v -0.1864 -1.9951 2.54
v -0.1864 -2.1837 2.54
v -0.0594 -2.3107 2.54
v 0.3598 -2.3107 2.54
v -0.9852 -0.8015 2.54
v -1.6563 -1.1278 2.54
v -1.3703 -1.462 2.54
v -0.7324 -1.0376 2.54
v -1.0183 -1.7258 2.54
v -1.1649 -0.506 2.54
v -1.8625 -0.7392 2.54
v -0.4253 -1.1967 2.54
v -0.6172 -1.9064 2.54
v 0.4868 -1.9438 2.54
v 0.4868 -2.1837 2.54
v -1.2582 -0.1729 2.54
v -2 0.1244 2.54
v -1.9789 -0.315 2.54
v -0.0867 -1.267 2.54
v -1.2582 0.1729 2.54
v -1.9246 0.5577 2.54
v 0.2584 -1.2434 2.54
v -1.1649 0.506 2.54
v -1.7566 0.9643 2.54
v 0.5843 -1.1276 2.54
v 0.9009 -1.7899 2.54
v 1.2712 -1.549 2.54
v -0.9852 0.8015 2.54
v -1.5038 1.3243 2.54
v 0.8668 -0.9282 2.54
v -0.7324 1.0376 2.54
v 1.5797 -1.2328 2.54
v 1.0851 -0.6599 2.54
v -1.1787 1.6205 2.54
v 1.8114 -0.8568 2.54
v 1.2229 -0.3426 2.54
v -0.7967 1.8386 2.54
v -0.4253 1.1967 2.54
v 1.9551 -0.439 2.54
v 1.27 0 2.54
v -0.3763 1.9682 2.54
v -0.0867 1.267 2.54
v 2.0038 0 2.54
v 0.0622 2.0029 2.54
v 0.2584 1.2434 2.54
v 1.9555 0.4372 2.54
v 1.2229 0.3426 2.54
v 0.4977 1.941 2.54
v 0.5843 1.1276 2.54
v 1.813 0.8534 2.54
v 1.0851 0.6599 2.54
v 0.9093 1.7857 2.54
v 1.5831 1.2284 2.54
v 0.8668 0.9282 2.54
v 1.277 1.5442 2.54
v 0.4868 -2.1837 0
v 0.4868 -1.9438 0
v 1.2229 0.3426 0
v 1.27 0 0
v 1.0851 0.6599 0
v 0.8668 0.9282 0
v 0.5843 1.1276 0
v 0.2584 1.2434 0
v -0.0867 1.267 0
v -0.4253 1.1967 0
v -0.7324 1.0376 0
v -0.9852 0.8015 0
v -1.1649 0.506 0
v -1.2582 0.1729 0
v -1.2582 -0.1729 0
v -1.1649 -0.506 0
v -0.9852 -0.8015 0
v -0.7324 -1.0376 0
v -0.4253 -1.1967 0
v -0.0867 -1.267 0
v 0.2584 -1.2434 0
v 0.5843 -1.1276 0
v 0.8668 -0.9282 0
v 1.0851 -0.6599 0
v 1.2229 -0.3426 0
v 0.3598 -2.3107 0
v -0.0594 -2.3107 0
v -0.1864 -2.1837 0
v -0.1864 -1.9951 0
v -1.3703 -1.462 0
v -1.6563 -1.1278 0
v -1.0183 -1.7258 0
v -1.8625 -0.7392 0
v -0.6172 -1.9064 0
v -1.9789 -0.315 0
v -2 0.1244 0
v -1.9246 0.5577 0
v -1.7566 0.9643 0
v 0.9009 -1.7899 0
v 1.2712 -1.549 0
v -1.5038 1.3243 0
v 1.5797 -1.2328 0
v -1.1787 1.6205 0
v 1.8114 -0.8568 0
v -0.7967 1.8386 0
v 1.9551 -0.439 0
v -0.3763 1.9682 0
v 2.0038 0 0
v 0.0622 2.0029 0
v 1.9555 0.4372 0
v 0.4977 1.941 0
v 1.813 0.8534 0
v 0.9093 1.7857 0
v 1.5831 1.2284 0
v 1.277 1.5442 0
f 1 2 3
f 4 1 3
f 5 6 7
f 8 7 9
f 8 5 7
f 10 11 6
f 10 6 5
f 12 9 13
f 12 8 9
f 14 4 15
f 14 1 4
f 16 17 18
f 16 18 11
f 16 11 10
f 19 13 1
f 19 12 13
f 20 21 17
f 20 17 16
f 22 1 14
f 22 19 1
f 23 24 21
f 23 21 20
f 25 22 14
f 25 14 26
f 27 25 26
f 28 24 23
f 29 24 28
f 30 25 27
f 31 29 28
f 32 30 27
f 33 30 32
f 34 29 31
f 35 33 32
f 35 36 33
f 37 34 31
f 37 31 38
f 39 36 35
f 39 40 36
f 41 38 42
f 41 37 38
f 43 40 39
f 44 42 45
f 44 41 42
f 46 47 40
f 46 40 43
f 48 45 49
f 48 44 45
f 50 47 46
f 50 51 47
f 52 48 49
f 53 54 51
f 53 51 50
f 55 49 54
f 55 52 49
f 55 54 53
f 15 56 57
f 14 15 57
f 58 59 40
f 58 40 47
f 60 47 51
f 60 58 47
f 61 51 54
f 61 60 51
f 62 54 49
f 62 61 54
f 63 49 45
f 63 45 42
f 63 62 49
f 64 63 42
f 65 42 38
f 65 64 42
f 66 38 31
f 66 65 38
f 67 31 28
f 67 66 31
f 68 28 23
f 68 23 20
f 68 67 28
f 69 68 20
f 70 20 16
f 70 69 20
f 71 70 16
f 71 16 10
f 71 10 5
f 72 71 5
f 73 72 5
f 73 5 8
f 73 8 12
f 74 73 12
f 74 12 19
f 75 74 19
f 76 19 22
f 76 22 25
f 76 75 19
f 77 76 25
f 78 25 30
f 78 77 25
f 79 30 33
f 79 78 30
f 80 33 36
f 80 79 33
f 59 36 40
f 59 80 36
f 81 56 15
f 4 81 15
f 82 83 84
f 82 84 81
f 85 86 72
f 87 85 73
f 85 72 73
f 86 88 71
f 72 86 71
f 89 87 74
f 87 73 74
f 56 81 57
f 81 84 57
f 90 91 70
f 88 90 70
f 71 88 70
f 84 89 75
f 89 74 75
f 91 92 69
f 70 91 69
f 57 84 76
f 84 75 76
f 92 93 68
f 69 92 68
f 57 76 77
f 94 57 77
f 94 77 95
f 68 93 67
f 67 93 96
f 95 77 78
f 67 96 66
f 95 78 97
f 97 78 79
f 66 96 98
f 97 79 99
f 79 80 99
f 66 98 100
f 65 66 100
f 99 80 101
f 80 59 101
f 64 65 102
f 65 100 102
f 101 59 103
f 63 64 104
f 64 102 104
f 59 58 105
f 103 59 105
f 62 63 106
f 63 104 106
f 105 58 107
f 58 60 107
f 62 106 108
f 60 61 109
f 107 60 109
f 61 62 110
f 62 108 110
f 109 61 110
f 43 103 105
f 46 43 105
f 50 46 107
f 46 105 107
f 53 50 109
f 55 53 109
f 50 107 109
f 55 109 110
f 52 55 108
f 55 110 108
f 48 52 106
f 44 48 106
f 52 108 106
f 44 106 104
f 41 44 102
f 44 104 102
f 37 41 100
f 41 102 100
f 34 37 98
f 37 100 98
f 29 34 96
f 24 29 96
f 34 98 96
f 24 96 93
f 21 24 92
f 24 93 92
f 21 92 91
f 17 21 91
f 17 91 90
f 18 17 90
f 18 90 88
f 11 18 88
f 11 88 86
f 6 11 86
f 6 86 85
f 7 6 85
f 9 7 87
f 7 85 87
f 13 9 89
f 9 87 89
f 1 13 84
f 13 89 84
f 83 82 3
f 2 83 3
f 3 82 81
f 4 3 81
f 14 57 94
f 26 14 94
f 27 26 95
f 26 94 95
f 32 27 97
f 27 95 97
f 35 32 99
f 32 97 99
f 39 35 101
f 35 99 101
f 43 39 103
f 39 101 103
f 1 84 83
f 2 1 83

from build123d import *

# Parameters (mm, degrees)
F0_R     = 1.27
F1_DEPTH = 2.54
F2_SIZE  = 0.127


with BuildPart() as f1:
    # F0 (on Top) → F1 (new body)
    with BuildSketch(Plane.XY):
        with BuildLine():
            ThreePointArc((0.486832, -1.943784), (1.579688, -1.232837), (2.003821, 0))
            ThreePointArc((2.003821, 0), (-1.349406, 1.481352), (-0.186398, -1.995133))
            Line((-0.186398, -1.995133), (-0.186398, -1.640521))
            Line((-0.186398, -1.640521), (0.486832, -1.640521))
            Line((0.486832, -1.640521), (0.486832, -1.943784))
        make_face()
        Circle(F0_R, mode=Mode.SUBTRACT)
        with BuildLine():
            Line((-0.186398, -1.640521), (-0.186398, -1.995133))
            ThreePointArc((-0.186398, -1.995133), (0.152396, -1.998018), (0.486832, -1.943784))
            Line((0.486832, -1.943784), (0.486832, -1.640521))
            Line((0.486832, -1.640521), (-0.186398, -1.640521))
        make_face()
        with BuildLine():
            ThreePointArc((0.486832, -1.943784), (0.152396, -1.998018), (-0.186398, -1.995133))
            Line((-0.186398, -1.995133), (-0.186398, -2.310709))
            Line((-0.186398, -2.310709), (0.486832, -2.310709))
            Line((0.486832, -2.310709), (0.486832, -1.943784))
        make_face()
    extrude(amount=F1_DEPTH)

    # F2
    f2_edges = [f1.edges().sort_by_distance(p)[0] for p in [
        (-0.186398, -2.310709, 1.27),
        (0.486832, -2.310709, 1.27),
    ]]
    chamfer(f2_edges, length=F2_SIZE)


solid = f1.part
